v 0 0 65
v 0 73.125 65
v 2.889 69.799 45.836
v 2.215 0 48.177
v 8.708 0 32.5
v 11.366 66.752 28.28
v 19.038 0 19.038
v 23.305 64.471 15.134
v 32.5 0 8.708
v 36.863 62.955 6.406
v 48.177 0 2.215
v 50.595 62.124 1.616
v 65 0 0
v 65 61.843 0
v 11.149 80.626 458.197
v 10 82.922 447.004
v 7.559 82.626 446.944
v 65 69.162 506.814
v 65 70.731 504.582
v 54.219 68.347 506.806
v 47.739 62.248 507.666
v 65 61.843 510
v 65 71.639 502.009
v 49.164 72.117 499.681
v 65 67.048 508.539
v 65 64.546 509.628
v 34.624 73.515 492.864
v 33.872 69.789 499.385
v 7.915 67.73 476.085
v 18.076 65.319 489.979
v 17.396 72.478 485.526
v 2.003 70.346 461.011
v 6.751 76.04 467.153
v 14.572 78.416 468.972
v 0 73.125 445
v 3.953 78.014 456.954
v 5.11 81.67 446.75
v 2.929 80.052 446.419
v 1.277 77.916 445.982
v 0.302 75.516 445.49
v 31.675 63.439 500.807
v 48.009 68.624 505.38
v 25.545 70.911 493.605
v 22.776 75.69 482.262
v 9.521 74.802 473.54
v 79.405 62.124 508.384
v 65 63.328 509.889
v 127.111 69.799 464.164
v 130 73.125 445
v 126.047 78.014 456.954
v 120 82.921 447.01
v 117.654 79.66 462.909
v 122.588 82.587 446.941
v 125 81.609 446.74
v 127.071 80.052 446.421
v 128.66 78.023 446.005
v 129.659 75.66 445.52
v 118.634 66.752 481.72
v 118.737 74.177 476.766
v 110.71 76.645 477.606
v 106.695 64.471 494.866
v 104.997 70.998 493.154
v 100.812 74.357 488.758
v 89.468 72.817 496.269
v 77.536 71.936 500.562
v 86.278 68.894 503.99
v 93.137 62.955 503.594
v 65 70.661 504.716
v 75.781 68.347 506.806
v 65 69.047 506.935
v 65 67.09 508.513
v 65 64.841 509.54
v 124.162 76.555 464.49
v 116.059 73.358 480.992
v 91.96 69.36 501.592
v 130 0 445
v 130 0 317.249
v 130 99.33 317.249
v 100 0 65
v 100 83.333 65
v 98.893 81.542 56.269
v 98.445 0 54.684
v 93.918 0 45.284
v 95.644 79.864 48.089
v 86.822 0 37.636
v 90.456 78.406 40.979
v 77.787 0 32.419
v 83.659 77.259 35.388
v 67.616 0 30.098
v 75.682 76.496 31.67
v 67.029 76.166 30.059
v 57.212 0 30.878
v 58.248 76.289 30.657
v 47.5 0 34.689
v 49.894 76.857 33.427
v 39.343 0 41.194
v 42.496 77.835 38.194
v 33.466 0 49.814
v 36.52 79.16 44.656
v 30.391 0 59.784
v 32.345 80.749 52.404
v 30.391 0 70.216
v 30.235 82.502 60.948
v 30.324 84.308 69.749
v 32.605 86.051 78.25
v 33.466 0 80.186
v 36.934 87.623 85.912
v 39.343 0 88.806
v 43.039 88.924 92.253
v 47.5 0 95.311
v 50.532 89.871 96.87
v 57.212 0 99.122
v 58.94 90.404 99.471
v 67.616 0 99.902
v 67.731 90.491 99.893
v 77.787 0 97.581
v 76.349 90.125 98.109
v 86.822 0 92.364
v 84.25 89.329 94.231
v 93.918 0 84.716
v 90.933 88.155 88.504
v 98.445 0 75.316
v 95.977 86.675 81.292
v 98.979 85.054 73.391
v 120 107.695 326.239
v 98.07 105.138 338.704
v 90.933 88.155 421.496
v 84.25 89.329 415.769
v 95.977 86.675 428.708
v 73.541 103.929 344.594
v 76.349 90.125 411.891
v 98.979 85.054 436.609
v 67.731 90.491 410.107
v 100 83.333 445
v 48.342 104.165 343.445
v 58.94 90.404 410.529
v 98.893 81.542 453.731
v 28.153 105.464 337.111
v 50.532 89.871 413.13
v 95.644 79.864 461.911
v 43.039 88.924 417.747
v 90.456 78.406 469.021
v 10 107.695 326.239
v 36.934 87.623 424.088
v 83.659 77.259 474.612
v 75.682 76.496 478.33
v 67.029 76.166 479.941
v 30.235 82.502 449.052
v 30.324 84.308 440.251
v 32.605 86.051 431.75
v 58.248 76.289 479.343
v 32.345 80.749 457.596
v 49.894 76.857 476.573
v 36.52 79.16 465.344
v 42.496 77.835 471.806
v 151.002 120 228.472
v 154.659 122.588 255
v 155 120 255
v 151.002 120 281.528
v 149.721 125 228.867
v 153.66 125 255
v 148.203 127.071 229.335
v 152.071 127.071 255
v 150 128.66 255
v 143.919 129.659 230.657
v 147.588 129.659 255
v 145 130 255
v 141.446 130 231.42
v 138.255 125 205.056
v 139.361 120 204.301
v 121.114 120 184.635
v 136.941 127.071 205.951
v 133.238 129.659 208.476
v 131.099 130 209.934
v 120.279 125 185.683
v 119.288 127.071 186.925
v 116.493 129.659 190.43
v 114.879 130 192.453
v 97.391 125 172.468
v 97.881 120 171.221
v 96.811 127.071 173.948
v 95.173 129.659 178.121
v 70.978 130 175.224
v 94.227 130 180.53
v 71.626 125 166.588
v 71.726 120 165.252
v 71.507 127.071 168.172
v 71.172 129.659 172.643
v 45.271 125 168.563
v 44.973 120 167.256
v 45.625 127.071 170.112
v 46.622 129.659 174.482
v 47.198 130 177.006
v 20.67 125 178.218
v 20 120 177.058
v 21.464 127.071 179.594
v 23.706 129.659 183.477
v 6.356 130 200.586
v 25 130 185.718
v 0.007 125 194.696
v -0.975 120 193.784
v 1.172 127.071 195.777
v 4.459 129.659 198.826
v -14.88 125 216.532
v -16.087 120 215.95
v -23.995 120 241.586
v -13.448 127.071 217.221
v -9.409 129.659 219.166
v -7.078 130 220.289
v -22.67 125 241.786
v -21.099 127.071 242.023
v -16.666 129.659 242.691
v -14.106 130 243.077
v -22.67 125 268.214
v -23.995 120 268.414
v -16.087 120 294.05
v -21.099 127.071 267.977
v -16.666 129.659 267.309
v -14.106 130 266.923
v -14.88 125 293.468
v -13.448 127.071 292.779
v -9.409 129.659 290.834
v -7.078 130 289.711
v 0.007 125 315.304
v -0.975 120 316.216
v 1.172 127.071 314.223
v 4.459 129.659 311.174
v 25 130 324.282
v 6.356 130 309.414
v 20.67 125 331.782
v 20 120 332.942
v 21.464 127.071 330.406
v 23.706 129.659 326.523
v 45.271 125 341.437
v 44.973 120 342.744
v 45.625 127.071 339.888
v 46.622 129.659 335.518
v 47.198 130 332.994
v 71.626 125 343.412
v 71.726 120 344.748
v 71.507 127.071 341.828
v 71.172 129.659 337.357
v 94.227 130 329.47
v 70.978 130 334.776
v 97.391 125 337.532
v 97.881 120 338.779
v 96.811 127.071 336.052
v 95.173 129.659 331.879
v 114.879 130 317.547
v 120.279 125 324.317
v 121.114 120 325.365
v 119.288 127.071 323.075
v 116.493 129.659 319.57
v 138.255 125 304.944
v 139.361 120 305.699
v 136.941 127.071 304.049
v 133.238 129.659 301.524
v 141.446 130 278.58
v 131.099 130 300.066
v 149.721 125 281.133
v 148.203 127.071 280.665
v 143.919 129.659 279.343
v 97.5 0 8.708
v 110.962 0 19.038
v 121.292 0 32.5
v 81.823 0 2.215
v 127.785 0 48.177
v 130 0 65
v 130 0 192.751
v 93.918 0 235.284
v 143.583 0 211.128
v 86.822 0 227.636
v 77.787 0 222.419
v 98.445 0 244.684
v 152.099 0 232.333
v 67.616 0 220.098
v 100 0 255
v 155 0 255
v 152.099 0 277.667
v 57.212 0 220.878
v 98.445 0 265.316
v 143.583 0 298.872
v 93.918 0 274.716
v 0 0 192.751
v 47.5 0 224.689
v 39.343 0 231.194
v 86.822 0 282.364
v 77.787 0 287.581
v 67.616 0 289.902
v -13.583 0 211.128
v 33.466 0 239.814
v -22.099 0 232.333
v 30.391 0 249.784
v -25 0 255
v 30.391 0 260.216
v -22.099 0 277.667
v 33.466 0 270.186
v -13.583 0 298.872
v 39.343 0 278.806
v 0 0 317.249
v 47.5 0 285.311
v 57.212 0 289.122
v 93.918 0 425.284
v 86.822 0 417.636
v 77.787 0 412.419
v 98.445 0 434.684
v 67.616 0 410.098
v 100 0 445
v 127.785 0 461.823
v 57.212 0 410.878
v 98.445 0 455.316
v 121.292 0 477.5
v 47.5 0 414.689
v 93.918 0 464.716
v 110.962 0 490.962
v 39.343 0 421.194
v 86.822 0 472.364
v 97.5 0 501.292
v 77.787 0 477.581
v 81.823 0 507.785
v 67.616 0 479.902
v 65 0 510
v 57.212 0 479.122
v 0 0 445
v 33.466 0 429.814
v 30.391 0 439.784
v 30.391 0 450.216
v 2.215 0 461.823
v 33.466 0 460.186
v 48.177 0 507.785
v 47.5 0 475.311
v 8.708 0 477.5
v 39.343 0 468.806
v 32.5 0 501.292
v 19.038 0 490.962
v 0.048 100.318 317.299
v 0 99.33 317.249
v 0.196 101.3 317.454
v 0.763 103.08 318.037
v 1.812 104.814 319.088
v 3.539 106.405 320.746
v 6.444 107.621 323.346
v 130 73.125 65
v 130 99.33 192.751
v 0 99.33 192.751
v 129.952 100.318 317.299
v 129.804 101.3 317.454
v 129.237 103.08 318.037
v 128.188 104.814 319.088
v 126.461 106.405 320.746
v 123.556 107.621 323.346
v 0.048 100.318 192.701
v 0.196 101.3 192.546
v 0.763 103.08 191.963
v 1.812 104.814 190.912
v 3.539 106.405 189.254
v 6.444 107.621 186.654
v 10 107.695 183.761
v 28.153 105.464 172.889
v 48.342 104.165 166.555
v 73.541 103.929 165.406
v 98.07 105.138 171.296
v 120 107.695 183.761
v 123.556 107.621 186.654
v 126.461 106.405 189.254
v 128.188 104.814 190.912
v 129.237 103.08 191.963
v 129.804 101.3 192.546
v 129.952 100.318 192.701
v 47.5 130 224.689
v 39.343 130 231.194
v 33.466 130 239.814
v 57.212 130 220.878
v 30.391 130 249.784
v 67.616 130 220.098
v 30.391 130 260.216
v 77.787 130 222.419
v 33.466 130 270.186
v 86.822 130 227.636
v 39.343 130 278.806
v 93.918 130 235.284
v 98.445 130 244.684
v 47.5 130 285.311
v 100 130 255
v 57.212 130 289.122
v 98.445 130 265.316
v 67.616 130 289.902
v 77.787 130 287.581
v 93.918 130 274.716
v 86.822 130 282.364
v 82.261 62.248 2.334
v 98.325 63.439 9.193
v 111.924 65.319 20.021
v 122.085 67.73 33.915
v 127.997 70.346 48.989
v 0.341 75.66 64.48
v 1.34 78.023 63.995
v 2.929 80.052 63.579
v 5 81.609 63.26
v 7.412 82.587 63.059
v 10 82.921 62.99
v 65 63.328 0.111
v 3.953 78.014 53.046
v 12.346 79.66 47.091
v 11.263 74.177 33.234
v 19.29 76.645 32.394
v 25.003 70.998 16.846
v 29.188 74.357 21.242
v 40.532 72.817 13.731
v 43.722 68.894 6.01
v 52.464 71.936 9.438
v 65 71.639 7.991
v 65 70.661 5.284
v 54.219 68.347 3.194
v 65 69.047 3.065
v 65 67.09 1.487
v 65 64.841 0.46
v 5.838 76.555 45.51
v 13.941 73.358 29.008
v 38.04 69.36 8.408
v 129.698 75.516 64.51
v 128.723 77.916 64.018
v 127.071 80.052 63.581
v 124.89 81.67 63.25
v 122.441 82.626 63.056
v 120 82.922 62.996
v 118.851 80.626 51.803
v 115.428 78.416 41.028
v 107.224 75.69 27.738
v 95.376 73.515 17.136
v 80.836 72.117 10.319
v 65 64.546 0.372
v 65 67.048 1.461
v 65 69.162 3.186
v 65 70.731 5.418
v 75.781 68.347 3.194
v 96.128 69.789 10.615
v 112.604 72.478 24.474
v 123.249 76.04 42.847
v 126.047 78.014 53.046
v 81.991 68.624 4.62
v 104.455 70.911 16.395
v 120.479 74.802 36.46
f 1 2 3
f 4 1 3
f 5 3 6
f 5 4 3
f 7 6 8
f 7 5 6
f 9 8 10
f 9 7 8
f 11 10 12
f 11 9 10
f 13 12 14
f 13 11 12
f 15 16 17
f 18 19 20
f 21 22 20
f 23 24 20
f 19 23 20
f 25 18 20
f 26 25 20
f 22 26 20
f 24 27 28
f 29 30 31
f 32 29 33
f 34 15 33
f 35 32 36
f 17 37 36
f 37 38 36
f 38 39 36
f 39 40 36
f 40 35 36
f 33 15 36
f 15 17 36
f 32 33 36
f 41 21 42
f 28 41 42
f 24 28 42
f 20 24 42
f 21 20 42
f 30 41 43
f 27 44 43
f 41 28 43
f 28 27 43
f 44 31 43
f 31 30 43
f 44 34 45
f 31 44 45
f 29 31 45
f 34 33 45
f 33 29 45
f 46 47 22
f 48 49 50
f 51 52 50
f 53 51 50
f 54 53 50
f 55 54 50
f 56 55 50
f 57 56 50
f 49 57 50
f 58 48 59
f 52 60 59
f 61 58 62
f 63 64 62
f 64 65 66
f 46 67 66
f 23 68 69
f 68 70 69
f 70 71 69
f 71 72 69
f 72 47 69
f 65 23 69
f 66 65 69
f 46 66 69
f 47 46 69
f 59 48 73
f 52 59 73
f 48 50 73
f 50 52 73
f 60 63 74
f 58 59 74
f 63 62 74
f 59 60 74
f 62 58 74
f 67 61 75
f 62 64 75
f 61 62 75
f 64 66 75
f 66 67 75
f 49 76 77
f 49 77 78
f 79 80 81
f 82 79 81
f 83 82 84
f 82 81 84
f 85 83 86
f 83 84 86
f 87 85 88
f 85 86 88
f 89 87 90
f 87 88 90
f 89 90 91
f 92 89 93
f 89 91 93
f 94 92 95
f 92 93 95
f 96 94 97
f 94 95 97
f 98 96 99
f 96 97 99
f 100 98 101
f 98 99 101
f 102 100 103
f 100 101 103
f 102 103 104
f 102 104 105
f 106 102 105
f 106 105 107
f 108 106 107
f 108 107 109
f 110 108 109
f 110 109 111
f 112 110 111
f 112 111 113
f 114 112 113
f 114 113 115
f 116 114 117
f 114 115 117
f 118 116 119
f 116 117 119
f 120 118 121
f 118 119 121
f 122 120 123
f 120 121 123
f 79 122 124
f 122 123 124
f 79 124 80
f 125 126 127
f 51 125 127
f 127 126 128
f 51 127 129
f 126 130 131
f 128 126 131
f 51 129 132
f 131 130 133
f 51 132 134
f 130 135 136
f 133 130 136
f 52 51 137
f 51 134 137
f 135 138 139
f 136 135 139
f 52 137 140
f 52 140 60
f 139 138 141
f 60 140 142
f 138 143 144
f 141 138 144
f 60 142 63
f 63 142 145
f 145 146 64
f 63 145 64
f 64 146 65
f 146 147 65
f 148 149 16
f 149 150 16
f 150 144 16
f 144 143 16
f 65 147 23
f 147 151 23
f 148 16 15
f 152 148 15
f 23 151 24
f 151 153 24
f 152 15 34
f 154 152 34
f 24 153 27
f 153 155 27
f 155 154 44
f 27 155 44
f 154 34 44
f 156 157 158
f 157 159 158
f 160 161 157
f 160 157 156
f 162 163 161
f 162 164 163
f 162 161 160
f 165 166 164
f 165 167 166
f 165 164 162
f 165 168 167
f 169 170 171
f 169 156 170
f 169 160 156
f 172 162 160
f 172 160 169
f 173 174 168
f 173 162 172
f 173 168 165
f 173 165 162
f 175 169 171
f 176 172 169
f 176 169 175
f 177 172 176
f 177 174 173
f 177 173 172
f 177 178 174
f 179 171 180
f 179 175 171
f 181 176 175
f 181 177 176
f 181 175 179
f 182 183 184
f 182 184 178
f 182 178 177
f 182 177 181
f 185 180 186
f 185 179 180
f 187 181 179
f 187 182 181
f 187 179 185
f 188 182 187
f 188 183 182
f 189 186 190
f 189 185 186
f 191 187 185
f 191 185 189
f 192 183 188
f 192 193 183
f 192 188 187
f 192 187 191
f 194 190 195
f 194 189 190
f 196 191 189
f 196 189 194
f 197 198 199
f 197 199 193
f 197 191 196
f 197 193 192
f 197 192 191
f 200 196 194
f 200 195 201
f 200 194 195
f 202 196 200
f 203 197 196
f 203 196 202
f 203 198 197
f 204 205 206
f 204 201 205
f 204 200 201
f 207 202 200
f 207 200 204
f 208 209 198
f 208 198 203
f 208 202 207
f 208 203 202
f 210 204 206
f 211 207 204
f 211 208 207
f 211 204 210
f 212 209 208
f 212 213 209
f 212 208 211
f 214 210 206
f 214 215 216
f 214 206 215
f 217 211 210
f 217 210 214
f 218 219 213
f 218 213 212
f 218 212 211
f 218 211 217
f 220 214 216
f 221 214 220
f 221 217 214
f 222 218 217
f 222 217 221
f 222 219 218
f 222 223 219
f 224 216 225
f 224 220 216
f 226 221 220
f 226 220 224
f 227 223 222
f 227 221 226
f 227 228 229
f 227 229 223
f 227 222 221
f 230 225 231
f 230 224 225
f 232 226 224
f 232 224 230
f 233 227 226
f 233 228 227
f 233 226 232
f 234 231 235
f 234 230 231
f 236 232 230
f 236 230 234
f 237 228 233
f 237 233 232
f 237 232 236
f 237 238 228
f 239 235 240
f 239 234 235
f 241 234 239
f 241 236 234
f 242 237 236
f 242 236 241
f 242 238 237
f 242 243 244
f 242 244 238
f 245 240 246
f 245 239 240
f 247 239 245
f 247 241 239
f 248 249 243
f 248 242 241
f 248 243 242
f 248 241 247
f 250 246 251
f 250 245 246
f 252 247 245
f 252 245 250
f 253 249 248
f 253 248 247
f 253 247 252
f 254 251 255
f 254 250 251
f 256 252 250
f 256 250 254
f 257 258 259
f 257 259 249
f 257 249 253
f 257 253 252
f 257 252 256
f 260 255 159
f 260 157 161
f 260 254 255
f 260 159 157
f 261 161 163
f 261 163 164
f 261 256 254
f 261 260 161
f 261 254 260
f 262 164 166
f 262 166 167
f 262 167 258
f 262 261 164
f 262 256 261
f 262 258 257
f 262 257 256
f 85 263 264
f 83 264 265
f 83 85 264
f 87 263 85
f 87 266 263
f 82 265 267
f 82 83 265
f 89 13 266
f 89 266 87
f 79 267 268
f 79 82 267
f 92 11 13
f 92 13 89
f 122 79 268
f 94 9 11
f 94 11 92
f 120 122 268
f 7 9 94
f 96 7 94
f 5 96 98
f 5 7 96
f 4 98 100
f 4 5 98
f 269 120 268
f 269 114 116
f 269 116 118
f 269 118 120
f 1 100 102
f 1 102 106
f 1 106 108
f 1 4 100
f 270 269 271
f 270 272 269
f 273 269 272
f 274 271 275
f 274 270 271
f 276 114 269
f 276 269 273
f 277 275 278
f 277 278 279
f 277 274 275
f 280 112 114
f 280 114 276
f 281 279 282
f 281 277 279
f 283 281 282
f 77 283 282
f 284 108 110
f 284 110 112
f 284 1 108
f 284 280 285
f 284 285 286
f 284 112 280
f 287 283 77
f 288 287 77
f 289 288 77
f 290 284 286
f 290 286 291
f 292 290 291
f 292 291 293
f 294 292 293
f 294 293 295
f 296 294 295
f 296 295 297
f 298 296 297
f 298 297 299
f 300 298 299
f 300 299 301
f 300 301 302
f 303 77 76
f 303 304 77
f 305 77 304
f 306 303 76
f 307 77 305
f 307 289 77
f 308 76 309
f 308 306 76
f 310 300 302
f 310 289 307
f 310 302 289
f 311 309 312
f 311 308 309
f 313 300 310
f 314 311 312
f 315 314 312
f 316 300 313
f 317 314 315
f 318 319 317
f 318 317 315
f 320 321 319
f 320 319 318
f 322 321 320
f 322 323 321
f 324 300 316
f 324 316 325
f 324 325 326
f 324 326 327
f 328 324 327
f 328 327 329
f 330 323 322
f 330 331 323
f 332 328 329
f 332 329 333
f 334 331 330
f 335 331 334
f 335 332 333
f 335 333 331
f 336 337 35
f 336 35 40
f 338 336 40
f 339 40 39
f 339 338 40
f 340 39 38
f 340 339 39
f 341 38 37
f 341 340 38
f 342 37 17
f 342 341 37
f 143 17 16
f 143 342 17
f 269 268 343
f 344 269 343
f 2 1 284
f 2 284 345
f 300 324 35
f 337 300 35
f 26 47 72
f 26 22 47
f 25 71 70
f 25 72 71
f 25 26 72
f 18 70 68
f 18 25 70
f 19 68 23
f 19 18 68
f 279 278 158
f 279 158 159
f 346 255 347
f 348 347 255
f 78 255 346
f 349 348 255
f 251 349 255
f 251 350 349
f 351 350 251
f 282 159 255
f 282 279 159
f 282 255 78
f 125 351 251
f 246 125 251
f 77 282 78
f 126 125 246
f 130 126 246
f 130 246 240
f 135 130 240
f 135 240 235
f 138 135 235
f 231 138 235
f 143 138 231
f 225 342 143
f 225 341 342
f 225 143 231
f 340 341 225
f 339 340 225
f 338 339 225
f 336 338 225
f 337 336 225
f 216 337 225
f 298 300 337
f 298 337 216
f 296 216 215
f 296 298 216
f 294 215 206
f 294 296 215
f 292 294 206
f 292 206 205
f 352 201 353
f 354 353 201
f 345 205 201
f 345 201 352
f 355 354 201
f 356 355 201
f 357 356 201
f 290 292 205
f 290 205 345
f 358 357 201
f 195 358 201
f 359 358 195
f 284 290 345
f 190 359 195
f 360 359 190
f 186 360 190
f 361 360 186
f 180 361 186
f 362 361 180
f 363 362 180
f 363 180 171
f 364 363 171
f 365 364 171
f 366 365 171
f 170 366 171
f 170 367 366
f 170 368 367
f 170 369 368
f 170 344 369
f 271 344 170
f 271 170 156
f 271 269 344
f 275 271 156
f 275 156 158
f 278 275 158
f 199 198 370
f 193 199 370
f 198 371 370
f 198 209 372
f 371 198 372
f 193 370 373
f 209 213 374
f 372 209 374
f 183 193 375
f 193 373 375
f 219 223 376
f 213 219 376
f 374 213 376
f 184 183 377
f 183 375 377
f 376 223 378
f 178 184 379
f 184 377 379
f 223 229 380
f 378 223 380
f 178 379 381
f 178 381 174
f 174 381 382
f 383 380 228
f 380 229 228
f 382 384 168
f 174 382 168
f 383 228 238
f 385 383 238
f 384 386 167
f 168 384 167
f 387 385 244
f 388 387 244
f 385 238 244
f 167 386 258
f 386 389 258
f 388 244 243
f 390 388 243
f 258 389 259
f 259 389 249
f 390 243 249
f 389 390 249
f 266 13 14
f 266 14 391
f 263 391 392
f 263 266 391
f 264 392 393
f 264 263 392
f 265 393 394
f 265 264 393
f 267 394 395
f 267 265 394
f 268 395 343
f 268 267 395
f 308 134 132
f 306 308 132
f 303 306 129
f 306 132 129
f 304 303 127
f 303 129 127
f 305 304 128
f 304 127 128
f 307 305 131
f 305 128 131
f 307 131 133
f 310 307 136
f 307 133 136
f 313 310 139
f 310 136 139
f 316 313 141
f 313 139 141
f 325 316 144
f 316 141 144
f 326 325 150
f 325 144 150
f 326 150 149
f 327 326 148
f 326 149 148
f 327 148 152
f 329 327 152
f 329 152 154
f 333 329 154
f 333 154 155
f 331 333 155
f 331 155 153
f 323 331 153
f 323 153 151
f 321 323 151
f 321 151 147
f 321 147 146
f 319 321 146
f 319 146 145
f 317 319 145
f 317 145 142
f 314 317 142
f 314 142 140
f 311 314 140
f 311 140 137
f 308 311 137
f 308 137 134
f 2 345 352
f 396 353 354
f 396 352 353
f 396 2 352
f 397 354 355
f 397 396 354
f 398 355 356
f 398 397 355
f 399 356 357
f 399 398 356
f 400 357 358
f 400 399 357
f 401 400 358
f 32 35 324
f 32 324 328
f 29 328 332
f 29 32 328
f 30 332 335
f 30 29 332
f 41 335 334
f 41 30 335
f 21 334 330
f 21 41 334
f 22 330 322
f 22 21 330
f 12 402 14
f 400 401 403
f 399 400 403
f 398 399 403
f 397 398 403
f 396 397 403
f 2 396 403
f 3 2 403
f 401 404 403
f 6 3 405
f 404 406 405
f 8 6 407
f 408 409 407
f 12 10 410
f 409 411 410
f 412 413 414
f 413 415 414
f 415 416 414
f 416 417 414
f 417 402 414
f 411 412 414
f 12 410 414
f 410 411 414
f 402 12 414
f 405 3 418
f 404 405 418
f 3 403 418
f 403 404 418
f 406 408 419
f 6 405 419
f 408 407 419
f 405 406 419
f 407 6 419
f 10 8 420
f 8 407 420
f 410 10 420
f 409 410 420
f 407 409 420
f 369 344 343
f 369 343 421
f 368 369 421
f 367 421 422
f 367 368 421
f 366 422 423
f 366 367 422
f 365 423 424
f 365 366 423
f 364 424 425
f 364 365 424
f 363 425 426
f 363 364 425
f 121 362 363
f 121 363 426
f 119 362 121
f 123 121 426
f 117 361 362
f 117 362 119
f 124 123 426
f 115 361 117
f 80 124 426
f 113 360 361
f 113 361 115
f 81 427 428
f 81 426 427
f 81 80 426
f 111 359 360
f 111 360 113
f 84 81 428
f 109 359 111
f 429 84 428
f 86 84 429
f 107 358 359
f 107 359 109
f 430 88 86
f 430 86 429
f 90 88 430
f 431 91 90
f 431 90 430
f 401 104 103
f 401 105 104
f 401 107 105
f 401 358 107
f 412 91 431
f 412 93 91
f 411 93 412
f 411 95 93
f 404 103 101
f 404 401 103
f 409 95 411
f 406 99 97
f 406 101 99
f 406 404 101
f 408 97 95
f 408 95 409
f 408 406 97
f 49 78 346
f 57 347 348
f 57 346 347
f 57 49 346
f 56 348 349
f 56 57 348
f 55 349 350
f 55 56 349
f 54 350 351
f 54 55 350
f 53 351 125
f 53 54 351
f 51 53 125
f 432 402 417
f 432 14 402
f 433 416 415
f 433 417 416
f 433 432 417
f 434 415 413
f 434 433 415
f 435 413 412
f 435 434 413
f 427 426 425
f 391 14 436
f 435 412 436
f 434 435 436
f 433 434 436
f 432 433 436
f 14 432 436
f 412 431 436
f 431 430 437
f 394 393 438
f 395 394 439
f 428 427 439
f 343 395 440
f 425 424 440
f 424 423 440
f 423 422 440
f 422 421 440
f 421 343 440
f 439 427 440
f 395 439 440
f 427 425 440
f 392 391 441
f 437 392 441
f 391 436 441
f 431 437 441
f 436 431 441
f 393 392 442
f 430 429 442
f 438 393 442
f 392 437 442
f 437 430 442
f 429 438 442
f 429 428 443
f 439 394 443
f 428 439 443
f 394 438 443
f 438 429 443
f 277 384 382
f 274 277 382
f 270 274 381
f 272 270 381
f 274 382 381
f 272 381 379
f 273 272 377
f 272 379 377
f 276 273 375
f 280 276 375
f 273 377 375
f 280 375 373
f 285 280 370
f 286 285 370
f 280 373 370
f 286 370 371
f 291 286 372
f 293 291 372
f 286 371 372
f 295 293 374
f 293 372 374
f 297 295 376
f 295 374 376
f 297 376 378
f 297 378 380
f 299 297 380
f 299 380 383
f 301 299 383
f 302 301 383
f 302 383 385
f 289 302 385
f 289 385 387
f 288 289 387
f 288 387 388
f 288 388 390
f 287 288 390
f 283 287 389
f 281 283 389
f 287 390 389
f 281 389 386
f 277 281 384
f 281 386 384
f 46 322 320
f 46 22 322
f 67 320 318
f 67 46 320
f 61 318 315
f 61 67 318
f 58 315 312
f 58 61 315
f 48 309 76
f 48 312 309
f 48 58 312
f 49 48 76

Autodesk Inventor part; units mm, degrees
ref_plane "YZ Plane" through (0, 0, 0) normal (1, 0, 0) x (0, 1, 0)
ref_plane "XZ Plane" through (0, 0, 0) normal (0, 1, 0) x (-1, 0, 0)
ref_plane "XY Plane" through (0, 0, 0) normal (0, 0, 1) x (1, 0, 0)
sketch "Sketch5" plane through (0, 0, 0) normal (1, 0, 0) x (0, 1, 0)
  line L0 (0, 0) -> (0, 510)
  line L1 (0, 510) -> (70, 510)
  line L2 (70, 510) -> (70, 0)
  line L3 (70, 0) -> (0, 0)
  line L4 (0, 255) -> (110, 255)
  line L5 (110, 255) -> (110, 315)
  line L6 (110, 315) -> (70, 510)
  line L7 (110, 255) -> (110, 195)
  line L8 (110, 195) -> (70, 0)
  line L9 (0, 345) -> (0, 255)
  dimension "d9" = 510
  dimension "d10" = 70
  dimension "d11" = 510
  dimension "d12" = 110
  dimension "d13" = 60
  dimension "d14" = 60
extrude "Extrusion4" add sketch "Sketch5" along normal blind 130
fillet "Fillet1" radius 65 4 edges at (130, 35, 510) (0, 35, 510) (130, 35, 0) (0, 35, 0)
sketch "Sketch7" plane through (0, 0, 65) normal (0, -1, 0) x (1, 0, 0)
  line L0 (0, -65) -> (0, 190)
  line L1 (0, 130) -> (0, 250) projected
  line L2 (0, 190) -> (65, 190)
  circle A0 centre (65, 190) radius 90
  dimension "d28" = 65
  dimension "d29" = 180
extrude "Extrusion6" add sketch "Sketch7" against normal blind 130
sketch "Sketch8" plane through (65, 130, 255) normal (0, 1, 0) x (1, 0, 0)
  circle A0 centre (0, 0) radius 35
  arc A1 (65, 190) -> (-65, 190) centre (0, 190) ccw projected
  circle A2 centre (0, 190) radius 35
  arc A3 (-65, -190) -> (65, -190) centre (0, -190) ccw projected
  circle A4 centre (0, -190) radius 35
  point P0 (-65, 255)
  dimension "d32" = 70
  dimension "d39" = 70
  dimension "d40" = 70
extrude "Extrusion7" cut sketch "Sketch8" against normal blind 130
thread "Thread1" size "TR70x4" class "7H" standard "ISO Metric Trapezoidal Threads" full length
fillet "Fillet2" radius 10 1 edges at (-25, 130, 255)
fillet "Fillet3" radius 10 6 edges at (110.962, 73.9052, 490.962) (0, 96.4359, 381.1248) (130, 96.4359, 381.1248) (110.962, 73.9052, 19.038) (0, 96.4359, 128.8752) (130, 96.4359, 128.8752)
properties part number "Base Superior"
